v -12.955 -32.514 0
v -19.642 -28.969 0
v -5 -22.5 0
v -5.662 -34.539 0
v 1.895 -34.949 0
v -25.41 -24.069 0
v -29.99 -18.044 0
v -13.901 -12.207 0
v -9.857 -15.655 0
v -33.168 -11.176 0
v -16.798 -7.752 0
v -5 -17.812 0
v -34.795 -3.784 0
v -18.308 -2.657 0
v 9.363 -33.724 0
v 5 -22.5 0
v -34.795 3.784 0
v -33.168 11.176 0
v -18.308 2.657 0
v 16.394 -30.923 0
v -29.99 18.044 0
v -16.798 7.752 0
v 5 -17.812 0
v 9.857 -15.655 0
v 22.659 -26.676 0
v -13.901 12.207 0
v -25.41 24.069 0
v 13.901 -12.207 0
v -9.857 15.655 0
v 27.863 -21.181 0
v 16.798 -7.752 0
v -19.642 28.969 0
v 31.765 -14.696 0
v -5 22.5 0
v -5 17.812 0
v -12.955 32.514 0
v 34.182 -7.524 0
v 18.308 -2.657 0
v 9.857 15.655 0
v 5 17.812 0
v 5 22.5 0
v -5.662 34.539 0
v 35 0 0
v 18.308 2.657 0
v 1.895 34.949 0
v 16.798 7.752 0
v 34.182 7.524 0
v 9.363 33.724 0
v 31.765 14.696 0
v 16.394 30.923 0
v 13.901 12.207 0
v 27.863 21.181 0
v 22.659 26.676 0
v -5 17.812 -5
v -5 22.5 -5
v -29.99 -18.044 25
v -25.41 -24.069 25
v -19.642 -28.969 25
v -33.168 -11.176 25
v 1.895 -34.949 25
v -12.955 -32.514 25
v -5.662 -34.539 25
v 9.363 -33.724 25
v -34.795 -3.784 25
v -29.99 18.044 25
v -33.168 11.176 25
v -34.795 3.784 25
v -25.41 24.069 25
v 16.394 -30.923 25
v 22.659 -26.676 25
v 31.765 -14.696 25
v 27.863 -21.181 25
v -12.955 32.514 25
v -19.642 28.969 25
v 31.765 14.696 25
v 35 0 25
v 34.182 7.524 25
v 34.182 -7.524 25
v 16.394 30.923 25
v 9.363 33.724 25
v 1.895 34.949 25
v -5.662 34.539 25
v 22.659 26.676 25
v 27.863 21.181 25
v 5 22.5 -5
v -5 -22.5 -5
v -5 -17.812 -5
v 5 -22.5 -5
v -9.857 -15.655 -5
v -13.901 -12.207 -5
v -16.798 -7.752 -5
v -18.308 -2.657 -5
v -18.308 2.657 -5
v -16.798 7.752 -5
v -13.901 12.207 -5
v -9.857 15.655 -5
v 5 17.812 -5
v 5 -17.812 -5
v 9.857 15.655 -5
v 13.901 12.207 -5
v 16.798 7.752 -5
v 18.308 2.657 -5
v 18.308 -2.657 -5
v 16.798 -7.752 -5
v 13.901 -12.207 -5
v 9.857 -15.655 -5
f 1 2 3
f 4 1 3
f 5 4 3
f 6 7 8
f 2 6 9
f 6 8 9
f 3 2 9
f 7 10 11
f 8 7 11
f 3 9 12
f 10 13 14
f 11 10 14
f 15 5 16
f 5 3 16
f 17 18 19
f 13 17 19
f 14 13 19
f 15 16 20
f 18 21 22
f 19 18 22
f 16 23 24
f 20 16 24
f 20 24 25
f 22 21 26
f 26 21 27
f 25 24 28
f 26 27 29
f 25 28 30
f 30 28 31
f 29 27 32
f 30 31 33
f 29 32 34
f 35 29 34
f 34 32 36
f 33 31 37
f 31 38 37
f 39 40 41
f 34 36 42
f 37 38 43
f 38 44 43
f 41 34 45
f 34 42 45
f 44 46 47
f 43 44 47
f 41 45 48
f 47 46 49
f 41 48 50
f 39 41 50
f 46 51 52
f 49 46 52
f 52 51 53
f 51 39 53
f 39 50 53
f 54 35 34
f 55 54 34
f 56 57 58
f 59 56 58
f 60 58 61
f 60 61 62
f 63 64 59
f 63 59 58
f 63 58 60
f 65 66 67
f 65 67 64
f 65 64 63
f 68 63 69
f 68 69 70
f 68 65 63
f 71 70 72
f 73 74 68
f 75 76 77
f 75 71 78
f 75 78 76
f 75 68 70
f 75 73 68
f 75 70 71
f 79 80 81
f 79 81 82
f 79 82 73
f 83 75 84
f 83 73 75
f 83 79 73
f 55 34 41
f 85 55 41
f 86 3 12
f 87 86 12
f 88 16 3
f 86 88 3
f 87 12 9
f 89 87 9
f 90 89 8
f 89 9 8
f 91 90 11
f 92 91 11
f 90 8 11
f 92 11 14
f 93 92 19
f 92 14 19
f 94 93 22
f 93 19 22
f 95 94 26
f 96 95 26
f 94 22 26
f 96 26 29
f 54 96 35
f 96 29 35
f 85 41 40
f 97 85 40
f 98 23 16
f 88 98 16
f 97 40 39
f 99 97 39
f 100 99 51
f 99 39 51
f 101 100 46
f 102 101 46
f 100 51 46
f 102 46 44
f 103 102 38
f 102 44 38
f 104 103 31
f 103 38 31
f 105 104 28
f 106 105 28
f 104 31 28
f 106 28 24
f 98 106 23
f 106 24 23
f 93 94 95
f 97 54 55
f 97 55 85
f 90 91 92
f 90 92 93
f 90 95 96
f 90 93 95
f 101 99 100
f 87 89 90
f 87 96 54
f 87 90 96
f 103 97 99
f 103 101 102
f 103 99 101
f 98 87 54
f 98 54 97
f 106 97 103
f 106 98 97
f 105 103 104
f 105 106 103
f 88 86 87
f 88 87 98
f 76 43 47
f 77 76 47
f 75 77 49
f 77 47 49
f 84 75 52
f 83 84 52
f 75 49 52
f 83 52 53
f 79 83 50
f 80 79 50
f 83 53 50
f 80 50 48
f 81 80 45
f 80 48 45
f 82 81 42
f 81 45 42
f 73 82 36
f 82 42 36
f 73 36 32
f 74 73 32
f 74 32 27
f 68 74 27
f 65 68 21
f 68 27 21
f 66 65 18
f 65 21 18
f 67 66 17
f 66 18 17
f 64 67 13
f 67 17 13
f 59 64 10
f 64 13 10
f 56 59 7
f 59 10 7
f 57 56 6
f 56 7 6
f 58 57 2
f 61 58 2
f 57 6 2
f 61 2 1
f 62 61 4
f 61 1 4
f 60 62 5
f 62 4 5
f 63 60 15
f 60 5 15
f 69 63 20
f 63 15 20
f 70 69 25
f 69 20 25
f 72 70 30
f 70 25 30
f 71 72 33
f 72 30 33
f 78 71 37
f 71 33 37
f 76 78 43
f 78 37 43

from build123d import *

# Parameters (mm, degrees)
F0_R     = 35
F1_DEPTH = 25
F3_DEPTH = 5


with BuildPart() as f1:
    # F0 (on Top) → F1 (new body)
    with BuildSketch(Plane.XY):
        Circle(F0_R)
    extrude(amount=F1_DEPTH)

    # F2 (on face) → F3 (join)
    with BuildSketch(Plane(origin=(0, 0, 0), x_dir=(1, 0, 0), z_dir=(0, 0, -1))):
        with BuildLine():
            Line((-5, 22.5), (-5, 17.811513))
            ThreePointArc((-5, 17.811513), (-18.5, 0), (-5, -17.811513))
            Line((-5, -17.811513), (-5, -22.5))
            Line((-5, -22.5), (5, -22.5))
            Line((5, -22.5), (5, -17.811513))
            ThreePointArc((5, -17.811513), (18.5, 0), (5, 17.811513))
            Line((5, 17.811513), (5, 22.5))
            Line((5, 22.5), (-5, 22.5))
        make_face()
    extrude(amount=F3_DEPTH)


solid = f1.part
